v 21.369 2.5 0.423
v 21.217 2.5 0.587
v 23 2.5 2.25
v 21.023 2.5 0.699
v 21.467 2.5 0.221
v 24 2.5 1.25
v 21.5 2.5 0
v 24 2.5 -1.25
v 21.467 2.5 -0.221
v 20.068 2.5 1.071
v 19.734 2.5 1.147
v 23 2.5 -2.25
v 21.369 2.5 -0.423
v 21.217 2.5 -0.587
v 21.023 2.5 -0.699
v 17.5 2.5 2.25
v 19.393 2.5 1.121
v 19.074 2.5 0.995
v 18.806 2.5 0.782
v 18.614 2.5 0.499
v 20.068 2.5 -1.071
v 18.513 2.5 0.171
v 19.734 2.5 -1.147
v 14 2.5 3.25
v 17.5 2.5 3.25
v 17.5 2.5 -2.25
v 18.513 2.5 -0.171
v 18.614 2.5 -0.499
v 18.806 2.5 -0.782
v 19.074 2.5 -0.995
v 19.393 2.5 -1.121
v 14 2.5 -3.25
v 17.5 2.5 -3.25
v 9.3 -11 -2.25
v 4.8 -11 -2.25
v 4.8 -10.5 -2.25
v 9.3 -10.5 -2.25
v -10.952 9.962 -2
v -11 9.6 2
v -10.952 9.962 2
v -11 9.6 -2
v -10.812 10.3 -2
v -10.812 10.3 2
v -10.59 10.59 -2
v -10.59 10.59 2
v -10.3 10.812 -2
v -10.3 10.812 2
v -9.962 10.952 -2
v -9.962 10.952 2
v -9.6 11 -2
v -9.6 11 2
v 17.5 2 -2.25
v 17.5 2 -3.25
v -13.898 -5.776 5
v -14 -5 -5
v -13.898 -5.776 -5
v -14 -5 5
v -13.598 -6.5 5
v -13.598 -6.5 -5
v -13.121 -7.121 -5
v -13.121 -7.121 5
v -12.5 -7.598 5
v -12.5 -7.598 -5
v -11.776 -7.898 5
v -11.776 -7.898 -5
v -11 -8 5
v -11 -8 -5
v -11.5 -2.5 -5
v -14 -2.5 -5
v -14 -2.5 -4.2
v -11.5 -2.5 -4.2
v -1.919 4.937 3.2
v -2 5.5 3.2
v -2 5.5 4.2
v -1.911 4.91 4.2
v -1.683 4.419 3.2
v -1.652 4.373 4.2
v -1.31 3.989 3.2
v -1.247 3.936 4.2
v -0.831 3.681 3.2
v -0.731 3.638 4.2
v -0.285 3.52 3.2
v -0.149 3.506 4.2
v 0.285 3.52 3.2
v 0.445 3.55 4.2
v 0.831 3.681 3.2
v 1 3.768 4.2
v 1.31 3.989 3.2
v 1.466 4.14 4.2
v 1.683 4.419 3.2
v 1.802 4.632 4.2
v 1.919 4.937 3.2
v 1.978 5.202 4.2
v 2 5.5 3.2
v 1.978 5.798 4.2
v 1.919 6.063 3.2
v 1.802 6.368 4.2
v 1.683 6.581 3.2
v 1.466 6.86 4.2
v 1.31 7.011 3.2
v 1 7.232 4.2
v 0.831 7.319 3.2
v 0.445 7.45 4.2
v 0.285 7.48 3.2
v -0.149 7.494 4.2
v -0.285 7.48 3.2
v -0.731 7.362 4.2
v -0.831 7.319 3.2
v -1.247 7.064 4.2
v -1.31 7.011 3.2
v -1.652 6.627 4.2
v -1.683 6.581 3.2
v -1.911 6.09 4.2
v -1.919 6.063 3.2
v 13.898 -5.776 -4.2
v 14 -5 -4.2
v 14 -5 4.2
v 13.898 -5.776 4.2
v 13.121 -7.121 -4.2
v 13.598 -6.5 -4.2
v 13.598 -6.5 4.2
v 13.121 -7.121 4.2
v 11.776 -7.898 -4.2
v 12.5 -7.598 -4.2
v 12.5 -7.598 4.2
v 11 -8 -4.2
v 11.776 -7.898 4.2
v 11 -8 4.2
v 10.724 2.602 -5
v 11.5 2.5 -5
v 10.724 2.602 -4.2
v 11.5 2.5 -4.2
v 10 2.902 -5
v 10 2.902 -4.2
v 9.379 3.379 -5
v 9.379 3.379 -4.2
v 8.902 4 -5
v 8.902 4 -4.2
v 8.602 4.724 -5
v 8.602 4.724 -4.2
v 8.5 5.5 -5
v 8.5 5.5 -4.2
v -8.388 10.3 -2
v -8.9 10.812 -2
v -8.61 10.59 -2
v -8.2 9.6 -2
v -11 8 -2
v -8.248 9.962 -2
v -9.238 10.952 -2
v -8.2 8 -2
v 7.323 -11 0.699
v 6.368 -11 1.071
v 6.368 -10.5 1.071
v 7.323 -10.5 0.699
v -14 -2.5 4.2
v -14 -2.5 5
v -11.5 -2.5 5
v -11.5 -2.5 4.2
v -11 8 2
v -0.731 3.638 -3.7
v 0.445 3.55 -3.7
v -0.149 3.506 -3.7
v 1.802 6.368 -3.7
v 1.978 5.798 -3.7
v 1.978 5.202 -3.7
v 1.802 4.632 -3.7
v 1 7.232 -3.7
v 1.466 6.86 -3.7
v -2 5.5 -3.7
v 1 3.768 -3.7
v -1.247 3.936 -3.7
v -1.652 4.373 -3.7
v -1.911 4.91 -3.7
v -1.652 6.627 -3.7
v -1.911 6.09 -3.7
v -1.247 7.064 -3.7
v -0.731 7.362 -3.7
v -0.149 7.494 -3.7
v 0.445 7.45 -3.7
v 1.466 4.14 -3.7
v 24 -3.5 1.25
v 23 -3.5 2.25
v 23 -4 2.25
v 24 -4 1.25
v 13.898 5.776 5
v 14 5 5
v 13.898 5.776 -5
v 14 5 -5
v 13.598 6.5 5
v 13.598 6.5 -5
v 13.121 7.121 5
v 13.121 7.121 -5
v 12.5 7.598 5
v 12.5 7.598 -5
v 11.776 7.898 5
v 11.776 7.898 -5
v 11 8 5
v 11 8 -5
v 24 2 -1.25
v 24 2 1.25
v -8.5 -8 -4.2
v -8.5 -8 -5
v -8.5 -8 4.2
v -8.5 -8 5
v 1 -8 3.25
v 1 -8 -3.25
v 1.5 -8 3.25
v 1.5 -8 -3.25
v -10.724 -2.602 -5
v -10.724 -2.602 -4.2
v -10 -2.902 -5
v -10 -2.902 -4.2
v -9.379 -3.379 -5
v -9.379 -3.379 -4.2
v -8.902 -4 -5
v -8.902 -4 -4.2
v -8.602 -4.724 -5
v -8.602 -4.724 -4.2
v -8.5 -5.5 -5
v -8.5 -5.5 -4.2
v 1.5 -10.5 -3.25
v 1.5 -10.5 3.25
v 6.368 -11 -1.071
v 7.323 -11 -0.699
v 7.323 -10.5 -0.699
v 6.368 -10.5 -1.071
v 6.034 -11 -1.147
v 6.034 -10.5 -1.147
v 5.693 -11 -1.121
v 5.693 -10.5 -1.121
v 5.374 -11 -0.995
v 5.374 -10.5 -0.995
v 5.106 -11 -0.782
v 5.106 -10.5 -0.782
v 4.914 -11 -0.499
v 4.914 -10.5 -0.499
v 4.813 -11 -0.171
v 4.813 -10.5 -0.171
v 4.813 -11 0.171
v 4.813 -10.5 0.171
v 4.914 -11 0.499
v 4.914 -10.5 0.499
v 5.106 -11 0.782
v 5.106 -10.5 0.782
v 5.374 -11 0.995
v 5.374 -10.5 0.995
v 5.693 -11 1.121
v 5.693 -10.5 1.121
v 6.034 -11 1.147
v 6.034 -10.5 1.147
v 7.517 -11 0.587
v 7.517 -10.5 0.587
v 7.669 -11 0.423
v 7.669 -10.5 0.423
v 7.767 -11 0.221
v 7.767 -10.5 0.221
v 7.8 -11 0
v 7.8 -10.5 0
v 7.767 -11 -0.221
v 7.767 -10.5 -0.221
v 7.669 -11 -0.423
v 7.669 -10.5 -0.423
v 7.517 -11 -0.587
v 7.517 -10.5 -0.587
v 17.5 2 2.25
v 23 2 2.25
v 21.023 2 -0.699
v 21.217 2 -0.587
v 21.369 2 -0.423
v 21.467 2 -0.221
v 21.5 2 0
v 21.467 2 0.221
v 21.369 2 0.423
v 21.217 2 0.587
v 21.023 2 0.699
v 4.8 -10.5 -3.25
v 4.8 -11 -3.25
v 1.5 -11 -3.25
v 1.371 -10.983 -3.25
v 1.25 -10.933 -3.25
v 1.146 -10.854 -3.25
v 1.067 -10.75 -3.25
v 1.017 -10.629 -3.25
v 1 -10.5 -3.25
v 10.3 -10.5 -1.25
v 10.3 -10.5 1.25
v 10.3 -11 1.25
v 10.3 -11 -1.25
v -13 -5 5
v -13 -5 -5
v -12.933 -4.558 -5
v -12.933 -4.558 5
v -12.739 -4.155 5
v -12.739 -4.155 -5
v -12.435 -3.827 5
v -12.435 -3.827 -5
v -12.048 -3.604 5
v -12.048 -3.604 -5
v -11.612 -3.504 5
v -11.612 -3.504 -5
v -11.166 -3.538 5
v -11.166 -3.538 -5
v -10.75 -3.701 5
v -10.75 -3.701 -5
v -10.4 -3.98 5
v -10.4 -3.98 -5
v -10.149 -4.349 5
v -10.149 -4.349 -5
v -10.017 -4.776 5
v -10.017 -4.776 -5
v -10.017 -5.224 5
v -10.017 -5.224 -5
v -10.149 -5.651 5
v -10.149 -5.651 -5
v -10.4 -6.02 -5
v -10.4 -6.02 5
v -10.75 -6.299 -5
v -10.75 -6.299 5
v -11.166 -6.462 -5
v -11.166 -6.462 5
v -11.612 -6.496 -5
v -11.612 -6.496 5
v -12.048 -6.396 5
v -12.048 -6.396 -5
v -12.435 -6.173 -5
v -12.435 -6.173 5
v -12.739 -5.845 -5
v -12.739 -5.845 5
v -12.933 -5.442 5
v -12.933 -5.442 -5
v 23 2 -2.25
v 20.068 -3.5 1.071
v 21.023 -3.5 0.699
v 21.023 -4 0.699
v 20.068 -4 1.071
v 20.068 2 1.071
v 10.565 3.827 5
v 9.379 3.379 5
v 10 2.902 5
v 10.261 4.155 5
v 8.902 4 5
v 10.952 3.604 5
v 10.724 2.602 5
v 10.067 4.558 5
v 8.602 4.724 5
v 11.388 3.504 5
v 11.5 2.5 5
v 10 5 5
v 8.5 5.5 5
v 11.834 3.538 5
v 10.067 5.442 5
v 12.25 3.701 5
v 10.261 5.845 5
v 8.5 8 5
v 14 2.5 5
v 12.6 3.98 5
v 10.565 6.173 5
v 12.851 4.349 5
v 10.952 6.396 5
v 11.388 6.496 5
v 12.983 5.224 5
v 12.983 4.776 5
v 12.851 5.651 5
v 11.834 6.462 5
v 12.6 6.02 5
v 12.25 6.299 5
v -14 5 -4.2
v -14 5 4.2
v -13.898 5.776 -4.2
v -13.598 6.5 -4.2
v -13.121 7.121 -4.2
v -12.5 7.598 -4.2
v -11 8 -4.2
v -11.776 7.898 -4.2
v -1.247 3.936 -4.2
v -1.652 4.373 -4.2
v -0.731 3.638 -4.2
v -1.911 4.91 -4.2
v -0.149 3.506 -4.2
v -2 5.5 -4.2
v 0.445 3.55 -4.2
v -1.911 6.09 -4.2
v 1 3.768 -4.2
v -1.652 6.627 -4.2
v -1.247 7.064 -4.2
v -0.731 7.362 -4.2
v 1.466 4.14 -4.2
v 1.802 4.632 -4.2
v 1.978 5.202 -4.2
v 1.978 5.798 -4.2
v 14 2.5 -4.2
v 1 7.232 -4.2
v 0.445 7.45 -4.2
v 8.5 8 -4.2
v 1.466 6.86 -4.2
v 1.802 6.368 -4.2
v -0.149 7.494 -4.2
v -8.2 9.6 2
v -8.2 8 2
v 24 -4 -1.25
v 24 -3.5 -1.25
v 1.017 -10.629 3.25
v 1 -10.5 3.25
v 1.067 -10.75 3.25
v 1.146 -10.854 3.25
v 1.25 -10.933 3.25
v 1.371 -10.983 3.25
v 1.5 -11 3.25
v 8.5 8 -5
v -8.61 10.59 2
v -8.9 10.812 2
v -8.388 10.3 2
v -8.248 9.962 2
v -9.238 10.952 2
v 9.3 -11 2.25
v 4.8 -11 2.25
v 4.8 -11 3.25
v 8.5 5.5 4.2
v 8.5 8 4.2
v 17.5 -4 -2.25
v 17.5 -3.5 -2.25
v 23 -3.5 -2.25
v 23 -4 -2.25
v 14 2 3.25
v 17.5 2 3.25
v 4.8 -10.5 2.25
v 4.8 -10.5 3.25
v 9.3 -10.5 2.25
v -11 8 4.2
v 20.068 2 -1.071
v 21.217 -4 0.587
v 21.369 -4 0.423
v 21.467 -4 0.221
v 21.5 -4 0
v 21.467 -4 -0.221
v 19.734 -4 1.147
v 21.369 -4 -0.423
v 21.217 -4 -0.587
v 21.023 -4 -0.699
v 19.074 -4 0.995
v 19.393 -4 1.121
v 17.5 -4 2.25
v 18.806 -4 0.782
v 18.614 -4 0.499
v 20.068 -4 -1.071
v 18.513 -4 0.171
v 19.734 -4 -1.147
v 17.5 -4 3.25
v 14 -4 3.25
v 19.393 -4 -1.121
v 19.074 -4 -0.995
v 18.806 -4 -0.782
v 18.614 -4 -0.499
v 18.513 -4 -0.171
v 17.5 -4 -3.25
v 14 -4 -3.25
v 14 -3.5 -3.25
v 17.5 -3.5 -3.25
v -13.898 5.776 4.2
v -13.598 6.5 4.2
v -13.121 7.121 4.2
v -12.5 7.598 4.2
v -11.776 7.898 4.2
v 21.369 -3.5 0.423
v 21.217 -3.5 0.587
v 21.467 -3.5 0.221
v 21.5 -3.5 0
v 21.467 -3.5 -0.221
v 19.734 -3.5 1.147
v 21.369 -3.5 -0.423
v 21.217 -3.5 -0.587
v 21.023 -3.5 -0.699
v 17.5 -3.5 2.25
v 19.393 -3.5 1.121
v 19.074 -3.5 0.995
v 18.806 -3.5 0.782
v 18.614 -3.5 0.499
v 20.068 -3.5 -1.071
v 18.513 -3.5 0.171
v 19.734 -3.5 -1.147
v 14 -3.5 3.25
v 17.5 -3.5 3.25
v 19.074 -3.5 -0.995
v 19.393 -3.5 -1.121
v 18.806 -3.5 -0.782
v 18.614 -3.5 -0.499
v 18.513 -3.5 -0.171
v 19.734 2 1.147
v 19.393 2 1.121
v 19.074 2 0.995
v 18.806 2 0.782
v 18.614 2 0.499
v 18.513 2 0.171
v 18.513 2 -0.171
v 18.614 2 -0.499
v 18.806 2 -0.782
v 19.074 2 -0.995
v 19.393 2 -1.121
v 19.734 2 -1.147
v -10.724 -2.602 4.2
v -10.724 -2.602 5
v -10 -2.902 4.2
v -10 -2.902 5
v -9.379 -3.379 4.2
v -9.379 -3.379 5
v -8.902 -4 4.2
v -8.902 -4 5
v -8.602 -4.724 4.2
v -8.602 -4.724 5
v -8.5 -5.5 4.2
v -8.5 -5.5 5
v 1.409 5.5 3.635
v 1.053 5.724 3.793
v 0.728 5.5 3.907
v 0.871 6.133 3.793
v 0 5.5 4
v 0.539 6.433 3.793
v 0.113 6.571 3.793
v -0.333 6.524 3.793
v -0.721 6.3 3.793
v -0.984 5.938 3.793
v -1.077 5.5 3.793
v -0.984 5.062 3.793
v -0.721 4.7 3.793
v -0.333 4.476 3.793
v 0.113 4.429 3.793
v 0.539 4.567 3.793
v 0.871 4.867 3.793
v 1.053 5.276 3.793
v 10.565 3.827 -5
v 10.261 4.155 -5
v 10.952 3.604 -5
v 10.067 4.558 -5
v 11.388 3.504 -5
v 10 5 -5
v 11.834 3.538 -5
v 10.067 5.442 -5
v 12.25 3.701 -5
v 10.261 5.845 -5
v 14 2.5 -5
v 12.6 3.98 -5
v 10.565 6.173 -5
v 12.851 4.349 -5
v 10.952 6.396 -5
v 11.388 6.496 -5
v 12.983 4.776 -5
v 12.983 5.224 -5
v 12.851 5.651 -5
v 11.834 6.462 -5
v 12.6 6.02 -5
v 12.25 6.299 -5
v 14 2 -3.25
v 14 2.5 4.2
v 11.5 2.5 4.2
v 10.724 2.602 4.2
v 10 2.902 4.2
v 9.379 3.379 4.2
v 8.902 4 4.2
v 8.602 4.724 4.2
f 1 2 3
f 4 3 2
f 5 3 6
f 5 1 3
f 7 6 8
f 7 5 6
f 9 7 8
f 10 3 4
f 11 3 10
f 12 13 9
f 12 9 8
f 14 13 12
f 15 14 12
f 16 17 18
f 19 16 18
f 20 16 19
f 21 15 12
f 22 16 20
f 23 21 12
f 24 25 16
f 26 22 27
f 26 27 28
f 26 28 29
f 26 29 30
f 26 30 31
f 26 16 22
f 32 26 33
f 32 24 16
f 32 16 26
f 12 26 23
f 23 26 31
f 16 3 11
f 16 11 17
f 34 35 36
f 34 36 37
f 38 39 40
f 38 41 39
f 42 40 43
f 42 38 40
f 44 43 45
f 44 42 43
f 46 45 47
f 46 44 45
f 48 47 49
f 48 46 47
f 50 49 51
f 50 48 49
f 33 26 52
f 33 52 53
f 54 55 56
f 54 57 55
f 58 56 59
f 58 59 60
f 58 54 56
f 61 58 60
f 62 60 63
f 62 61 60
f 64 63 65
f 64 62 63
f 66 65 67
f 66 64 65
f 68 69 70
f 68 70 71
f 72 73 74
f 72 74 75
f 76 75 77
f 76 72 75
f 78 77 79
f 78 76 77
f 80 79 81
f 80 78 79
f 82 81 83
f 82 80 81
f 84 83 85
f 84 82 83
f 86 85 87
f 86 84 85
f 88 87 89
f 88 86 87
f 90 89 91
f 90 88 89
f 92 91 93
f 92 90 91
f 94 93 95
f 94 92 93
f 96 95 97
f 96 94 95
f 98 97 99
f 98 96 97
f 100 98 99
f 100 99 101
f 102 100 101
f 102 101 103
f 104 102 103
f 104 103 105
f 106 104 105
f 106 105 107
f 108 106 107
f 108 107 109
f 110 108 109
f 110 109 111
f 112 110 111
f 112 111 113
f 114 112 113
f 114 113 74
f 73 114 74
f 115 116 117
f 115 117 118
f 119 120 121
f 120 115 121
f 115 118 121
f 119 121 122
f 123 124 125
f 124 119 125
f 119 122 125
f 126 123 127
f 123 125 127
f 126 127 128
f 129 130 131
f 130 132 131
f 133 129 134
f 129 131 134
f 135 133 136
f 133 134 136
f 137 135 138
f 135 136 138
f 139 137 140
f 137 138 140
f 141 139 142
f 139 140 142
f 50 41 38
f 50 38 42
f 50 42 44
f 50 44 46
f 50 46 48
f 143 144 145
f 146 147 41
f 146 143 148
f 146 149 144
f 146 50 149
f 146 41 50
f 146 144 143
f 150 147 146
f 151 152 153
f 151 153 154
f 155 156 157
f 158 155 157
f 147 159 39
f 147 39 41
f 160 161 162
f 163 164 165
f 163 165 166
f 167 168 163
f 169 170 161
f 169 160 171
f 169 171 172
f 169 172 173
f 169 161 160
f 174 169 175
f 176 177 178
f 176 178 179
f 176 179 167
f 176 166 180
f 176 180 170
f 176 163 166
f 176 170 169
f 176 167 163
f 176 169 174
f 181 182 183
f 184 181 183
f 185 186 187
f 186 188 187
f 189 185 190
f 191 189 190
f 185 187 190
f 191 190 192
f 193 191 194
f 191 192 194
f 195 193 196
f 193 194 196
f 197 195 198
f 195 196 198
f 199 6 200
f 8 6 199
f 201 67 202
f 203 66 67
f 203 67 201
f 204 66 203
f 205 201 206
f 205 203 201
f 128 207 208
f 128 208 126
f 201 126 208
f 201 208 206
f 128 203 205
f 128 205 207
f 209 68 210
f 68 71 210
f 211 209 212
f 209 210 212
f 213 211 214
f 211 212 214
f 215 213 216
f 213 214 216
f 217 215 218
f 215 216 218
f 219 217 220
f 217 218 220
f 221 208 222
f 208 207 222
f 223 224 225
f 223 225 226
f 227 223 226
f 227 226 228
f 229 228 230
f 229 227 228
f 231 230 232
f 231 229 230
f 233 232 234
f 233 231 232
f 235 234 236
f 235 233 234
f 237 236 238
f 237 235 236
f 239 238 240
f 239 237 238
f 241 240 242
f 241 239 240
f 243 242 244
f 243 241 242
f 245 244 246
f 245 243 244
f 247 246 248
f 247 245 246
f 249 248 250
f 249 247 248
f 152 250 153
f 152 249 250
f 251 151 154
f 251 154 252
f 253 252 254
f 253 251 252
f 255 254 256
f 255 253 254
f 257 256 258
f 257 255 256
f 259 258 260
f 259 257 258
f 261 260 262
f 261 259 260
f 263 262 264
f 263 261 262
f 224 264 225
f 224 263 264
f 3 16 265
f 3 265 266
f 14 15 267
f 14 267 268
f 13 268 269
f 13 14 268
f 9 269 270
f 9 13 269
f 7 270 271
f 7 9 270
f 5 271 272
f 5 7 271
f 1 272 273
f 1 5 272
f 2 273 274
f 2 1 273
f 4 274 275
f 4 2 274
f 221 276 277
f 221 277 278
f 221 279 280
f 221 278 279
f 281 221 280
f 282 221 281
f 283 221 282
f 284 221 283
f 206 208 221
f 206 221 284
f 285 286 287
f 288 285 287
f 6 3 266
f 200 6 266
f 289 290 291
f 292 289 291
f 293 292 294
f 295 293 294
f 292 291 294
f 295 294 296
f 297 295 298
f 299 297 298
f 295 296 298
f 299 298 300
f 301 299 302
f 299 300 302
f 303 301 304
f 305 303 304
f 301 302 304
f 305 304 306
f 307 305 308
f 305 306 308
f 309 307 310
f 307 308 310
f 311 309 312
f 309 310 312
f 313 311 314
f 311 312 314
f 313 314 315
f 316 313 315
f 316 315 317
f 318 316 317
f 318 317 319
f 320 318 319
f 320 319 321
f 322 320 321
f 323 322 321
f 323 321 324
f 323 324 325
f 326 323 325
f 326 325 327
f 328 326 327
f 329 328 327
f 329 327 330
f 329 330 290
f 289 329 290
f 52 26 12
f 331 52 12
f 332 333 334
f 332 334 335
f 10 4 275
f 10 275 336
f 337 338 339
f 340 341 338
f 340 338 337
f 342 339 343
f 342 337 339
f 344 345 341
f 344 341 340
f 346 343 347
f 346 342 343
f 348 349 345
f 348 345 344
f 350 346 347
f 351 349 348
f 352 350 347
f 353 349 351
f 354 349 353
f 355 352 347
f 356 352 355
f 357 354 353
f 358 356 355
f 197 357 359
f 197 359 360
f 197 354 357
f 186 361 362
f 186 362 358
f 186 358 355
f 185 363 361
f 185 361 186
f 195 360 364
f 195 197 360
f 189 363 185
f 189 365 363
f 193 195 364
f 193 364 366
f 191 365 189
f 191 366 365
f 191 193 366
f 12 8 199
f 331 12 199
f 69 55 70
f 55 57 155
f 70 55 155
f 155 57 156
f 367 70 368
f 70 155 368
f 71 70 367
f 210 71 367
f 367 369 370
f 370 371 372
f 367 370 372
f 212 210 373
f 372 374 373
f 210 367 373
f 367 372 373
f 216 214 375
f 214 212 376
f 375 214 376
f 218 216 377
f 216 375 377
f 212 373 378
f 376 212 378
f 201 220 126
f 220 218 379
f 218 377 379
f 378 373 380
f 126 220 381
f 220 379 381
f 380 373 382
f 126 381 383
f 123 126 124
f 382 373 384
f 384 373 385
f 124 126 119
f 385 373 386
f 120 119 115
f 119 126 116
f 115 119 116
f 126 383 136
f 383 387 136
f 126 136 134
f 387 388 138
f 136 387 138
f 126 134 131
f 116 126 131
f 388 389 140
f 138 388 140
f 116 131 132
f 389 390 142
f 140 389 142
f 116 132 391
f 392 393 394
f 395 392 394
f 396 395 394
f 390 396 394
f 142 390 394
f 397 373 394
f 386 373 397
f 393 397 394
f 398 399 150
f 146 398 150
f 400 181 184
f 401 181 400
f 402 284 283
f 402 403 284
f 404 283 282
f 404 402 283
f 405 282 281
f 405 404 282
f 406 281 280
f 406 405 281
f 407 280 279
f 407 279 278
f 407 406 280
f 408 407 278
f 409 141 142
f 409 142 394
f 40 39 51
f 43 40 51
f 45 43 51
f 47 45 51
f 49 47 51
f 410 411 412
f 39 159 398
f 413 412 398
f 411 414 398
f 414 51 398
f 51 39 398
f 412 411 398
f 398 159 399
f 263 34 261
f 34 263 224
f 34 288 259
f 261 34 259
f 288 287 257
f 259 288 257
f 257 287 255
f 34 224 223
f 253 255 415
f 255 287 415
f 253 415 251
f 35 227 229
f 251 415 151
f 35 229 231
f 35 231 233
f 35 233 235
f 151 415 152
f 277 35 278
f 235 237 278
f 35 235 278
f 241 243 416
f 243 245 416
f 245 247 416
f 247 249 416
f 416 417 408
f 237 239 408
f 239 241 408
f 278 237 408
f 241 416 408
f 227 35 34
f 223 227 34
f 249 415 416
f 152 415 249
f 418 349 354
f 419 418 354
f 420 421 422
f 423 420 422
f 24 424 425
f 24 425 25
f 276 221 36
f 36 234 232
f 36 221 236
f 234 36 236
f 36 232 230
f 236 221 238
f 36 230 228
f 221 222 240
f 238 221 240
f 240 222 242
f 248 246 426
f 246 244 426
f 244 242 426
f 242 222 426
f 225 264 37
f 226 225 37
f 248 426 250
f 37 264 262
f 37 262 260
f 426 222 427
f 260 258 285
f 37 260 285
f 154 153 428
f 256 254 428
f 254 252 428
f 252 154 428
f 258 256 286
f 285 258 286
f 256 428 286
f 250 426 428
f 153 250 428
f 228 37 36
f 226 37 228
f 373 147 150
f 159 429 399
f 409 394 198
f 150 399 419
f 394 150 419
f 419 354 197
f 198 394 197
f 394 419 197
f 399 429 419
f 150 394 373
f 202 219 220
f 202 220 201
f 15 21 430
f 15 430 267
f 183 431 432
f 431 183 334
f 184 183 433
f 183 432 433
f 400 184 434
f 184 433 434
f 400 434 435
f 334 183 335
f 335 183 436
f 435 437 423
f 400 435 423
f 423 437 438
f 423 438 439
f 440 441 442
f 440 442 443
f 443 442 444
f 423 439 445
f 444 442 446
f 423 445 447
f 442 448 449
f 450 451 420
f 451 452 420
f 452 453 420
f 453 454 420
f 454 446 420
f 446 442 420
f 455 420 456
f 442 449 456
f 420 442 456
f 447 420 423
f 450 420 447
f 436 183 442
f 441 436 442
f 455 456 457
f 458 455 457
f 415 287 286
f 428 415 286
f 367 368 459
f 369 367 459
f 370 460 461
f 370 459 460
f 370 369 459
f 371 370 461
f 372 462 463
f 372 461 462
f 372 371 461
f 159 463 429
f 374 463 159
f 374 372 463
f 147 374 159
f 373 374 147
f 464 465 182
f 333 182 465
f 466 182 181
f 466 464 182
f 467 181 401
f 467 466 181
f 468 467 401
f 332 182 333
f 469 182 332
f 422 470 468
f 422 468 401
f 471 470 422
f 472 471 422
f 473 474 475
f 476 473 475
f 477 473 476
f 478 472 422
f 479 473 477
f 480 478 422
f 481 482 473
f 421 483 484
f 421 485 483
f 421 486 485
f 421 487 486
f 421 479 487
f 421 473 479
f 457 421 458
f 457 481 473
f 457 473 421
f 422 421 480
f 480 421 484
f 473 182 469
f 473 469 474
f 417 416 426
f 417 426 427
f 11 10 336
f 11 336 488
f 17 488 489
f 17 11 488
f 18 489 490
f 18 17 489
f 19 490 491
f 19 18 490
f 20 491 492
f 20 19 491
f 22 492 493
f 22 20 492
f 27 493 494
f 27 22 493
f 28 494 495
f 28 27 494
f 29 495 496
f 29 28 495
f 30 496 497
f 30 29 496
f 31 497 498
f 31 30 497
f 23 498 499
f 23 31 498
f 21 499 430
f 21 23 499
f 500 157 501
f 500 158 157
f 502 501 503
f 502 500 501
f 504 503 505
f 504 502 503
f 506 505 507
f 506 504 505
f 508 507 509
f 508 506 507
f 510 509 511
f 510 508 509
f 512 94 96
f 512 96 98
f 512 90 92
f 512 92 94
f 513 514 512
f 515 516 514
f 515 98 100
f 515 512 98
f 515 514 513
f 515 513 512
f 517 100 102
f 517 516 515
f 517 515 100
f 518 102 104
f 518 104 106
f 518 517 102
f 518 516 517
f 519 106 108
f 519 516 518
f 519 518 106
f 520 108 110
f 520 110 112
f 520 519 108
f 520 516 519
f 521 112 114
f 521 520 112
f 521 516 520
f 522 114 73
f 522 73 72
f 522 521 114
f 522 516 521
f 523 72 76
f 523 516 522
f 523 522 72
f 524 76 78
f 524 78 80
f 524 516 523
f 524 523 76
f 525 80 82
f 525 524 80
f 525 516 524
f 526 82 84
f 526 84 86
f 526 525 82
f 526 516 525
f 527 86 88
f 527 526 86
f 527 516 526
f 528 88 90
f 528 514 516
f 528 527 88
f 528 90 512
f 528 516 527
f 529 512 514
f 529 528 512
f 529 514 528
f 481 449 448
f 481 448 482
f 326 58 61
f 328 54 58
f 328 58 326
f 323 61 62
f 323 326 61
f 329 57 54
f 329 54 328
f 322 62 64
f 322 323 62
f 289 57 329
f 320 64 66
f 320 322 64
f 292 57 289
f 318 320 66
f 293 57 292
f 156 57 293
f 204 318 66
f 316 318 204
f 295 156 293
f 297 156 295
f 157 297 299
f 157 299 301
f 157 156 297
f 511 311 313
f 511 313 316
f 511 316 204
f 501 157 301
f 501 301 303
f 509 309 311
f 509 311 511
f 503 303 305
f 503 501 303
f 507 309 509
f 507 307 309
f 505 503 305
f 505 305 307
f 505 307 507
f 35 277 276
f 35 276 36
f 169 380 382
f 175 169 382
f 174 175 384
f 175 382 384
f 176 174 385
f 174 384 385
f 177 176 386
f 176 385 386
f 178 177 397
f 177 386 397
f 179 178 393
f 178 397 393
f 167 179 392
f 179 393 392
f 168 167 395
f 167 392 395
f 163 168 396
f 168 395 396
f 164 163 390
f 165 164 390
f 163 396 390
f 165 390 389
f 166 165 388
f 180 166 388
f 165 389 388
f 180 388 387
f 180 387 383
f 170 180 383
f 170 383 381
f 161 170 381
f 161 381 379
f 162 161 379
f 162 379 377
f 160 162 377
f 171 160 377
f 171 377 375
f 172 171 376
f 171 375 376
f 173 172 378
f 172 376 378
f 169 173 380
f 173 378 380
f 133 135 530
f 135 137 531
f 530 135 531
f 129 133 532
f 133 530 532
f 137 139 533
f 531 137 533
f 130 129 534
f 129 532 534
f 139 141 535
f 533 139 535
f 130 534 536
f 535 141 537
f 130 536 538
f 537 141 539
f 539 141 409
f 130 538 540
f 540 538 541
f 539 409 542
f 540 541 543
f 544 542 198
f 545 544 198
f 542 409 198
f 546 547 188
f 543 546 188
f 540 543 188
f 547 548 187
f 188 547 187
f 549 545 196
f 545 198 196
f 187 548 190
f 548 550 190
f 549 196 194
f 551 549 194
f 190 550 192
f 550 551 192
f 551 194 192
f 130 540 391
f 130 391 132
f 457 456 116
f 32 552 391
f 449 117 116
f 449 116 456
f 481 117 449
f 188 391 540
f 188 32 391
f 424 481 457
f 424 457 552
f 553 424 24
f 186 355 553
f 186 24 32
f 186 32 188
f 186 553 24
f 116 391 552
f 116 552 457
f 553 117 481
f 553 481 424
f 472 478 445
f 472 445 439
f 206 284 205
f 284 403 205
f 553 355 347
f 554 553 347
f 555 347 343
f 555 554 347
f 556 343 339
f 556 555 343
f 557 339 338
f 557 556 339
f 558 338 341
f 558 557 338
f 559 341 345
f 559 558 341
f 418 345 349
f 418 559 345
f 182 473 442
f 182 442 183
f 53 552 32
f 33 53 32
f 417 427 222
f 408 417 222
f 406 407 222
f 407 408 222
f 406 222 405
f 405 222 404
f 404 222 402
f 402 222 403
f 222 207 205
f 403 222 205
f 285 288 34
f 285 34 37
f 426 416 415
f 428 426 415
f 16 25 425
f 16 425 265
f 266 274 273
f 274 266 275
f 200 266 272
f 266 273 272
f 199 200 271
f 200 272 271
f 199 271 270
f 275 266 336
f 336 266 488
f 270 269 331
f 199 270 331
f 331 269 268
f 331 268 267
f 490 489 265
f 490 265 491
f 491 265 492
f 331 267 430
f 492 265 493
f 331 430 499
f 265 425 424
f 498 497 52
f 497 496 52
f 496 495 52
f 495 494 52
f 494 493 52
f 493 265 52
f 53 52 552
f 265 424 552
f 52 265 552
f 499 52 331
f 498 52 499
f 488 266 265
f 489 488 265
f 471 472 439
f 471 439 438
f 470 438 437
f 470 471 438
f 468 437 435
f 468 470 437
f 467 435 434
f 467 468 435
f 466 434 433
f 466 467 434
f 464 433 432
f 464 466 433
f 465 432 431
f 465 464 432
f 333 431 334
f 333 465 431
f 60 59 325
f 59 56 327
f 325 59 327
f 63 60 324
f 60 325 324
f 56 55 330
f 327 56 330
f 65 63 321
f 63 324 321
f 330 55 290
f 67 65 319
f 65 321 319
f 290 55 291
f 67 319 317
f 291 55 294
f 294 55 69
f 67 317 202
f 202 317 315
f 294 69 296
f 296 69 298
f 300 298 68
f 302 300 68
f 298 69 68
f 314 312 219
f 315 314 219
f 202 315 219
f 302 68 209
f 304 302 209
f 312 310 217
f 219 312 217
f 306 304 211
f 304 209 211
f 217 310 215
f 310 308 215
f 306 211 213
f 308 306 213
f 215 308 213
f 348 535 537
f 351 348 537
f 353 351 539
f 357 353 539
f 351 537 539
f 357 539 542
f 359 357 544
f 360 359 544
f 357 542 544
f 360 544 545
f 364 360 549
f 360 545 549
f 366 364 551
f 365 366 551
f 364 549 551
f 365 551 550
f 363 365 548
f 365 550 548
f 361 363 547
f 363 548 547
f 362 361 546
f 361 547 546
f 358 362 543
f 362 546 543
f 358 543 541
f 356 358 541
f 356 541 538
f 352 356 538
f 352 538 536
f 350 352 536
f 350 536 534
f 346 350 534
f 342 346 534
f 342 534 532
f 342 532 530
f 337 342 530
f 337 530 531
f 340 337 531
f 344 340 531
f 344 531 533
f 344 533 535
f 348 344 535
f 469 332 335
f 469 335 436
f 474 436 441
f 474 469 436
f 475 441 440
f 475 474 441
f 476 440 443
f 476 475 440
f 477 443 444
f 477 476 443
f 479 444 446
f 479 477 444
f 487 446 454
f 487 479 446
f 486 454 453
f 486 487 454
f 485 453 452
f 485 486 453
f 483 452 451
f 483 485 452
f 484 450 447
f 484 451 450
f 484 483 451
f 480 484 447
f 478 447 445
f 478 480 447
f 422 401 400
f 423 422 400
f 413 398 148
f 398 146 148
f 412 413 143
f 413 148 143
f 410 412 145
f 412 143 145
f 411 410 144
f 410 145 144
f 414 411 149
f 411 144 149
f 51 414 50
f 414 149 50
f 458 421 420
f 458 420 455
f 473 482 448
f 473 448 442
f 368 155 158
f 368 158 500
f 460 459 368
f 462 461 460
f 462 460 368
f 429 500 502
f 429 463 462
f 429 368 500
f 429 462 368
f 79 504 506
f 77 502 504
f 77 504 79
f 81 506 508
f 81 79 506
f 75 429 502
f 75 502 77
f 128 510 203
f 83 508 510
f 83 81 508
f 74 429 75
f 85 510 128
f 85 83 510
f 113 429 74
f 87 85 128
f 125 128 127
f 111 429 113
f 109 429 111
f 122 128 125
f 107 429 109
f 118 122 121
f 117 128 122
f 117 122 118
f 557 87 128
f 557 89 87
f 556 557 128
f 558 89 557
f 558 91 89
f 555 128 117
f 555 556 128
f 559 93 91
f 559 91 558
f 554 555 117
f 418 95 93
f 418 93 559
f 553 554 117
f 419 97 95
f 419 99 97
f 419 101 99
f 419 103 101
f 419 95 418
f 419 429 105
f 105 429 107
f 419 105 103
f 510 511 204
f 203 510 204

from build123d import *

# Parameters (mm, degrees)
SKETCH_1_W             = 28
SKETCH_1_H             = 16
EXTRUDE_1_DEPTH        = 5
FILLET_1_R             = 3
CUT_EXTRUDE_2_DEPTH    = 0.8
FILLET_2_R             = 3
FILLET_2_OF_MIRROR_1_R = 3
SKETCH_3_R             = 1.5
CUT_EXTRUDE_3_DEPTH    = 19.973665961
SKETCH_4_R             = 2
CUT_EXTRUDE_4_DEPTH    = 0.5
CUT_EXTRUDE_START      = -1
SKETCH_5_R             = 2
CUT_EXTRUDE_5_DEPTH    = 1
SKETCH_10_W            = 6.5
SKETCH_10_H            = 0.5
EXTRUDE_9_DEPTH        = 10
SKETCH_11_W            = 6.5
SKETCH_11_H            = 1
CUT_EXTRUDE_10_DEPTH   = 27.669270706
CHAMFER_1_SIZE         = 1
EXTRUDE_11_DEPTH       = 3.25
FILLET_7_R             = 0.5
SKETCH_13_W            = 5.5
SKETCH_13_H            = 1
CUT_EXTRUDE_12_DEPTH   = 3
CHAMFER_2_SIZE         = 1
SKETCH_14_W            = 2.8
SKETCH_14_H            = 4
EXTRUDE_13_DEPTH       = 3
FILLET_8_R             = 1.4


with BuildPart() as part:
    # 草圖1 → 伸長1 (new, symmetric)
    with BuildSketch(Plane.XY):
        Rectangle(SKETCH_1_W, SKETCH_1_H)
    extrude(amount=EXTRUDE_1_DEPTH, both=True)

    # 圓角1
    fillet_1_edges = [part.edges().sort_by_distance(p)[0] for p in [
        (-14, 8, 0),
        (14, 8, 0),
        (14, -8, 0),
        (-14, -8, 0),
    ]]
    fillet(fillet_1_edges, radius=FILLET_1_R)

    # 草圖2 → 伸長2 (cut)
    with BuildSketch(Plane.XY.offset(5)):
        with BuildLine():
            Line((-14, -2.5), (-8.5, -2.5))
            Line((-8.5, -2.5), (-8.5, -8))
            Line((-8.5, -8), (11, -8))
            ThreePointArc((11, -8), (13.121320344, -7.121320344), (14, -5))
            Line((14, -5), (14, 2.5))
            Line((14, 2.5), (8.5, 2.5))
            Line((8.5, 2.5), (8.5, 8))
            Line((8.5, 8), (-11, 8))
            ThreePointArc((-11, 8), (-13.121320344, 7.121320344), (-14, 5))
            Line((-14, 5), (-14, -2.5))
        make_face()
    cut_extrude_2 = extrude(amount=-CUT_EXTRUDE_2_DEPTH, mode=Mode.SUBTRACT)

    # 圓角2
    fillet_2_edges = [part.edges().sort_by_distance(p)[0] for p in [
        (8.5, 2.5, 4.6),
        (-8.5, -2.5, 4.6),
    ]]
    fillet(fillet_2_edges, radius=FILLET_2_R)

    # 鏡射1: 伸長2 across plane
    add(cut_extrude_2.mirror(Plane.XY), mode=Mode.SUBTRACT)

    # 圓角2 of 鏡射1
    fillet_2_of_mirror_1_edges = [part.edges().sort_by_distance(p)[0] for p in [
        (8.5, 2.5, -4.6),
        (-8.5, -2.5, -4.6),
    ]]
    fillet(fillet_2_of_mirror_1_edges, radius=FILLET_2_OF_MIRROR_1_R)

    # 草圖3 → 伸長3 (cut, through all)
    with BuildSketch(Plane(origin=(0, 0, -5), x_dir=(-1, 0, 0), z_dir=(0, 0, -1))):
        with Locations((-11.5, 5)):
            Circle(SKETCH_3_R)
        with Locations((11.5, -5)):
            Circle(SKETCH_3_R)
    extrude(amount=-CUT_EXTRUDE_3_DEPTH, mode=Mode.SUBTRACT)

    # 草圖4 → 伸長4 (cut)
    with BuildSketch(Plane(origin=(0, 0, -4.2), x_dir=(-1, 0, 0), z_dir=(0, 0, -1))):
        with Locations((0, 5.5)):
            Circle(SKETCH_4_R)
    extrude(amount=-CUT_EXTRUDE_4_DEPTH, mode=Mode.SUBTRACT)

    # 草圖5 → 伸長5 (cut)
    with BuildSketch(Plane.XY.offset(4.2).offset(CUT_EXTRUDE_START)):
        with Locations(Location((0, 5.5, 0), (0, 0, 180))):
            Circle(SKETCH_5_R)
    extrude(amount=CUT_EXTRUDE_5_DEPTH, mode=Mode.SUBTRACT)

    # 草圖9 → 旋轉1 (revolve)
    with BuildSketch(Plane(origin=(0, 5.5, 0), x_dir=(-1, 0, 0), z_dir=(0, 1, 0)), mode=Mode.PRIVATE) as revolve_1_sk:
        with BuildLine():
            Line((0, 3.2), (2, 3.2))
            ThreePointArc((2, 3.2), (1.077032961, 3.792582404), (0, 4))
            Line((0, 4), (0, 3.2))
        make_face()
    revolve(revolve_1_sk.sketch.rotate(Axis((0, 5.5, 3.2), (0, 0, 1)), 180), axis=Axis((0, 5.5, 3.2), (0, 0, 1)))

    # 草圖10 → 伸長9 (add)
    with BuildSketch(Plane(origin=(14, 0, 0), x_dir=(0, 0, -1), z_dir=(1, 0, 0))):
        with Locations((0, -3.75)):
            Rectangle(SKETCH_10_W, SKETCH_10_H)
        with Locations((0, 2.25)):
            Rectangle(SKETCH_10_W, SKETCH_10_H)
    extrude(amount=EXTRUDE_9_DEPTH)

    # 草圖11 → 伸長10 (cut, through all)
    with BuildSketch(Plane(origin=(0, 2.5, 0), x_dir=(1, 0, 0), z_dir=(0, 1, 0))):
        with BuildLine():
            Line((20.068181818, 1.071272126), (21.022727273, 0.698655734))
            ThreePointArc((21.022727273, 0.698655734), (21.5, 0), (21.022727273, -0.698655734))
            Line((21.022727273, -0.698655734), (20.068181818, -1.071272126))
            ThreePointArc((20.068181818, -1.071272126), (18.5, 0), (20.068181818, 1.071272126))
        make_face()
        with Locations((20.75, 2.75)):
            Rectangle(SKETCH_11_W, SKETCH_11_H)
        with Locations((20.75, -2.75)):
            Rectangle(SKETCH_11_W, SKETCH_11_H)
    extrude(amount=-CUT_EXTRUDE_10_DEPTH, mode=Mode.SUBTRACT)

    # 導角1
    chamfer_1_edges = [part.edges().sort_by_distance(p)[0] for p in [
        (24, 2.25, -2.25),
        (24, -3.75, -2.25),
        (24, 2.25, 2.25),
        (24, -3.75, 2.25),
    ]]
    chamfer(chamfer_1_edges, length=CHAMFER_1_SIZE)

    # 草圖12 → 伸長11 (add, symmetric)
    with BuildSketch(Plane.XY):
        Polygon((1, -8), (1.5, -8), (1.5, -10.5), (10.3, -10.5), (10.3, -11), (1, -11), align=None)
    extrude(amount=EXTRUDE_11_DEPTH, both=True)

    # 圓角7
    fillet_7_edges = [part.edges().sort_by_distance(p)[0] for p in [
        (1, -11, 0),
    ]]
    fillet(fillet_7_edges, radius=FILLET_7_R)

    # 草圖13 → 伸長12 (cut)
    with BuildSketch(Plane.XZ.offset(11)):
        with Locations((7.55, 2.75)):
            Rectangle(SKETCH_13_W, SKETCH_13_H)
        with Locations((7.55, -2.75)):
            Rectangle(SKETCH_13_W, SKETCH_13_H)
        with BuildLine():
            Line((6.368181818, 1.071272126), (7.322727273, 0.698655734))
            ThreePointArc((7.322727273, 0.698655734), (7.8, 0), (7.322727273, -0.698655734))
            Line((7.322727273, -0.698655734), (6.368181818, -1.071272126))
            ThreePointArc((6.368181818, -1.071272126), (4.8, 0), (6.368181818, 1.071272126))
        make_face()
    extrude(amount=-CUT_EXTRUDE_12_DEPTH, mode=Mode.SUBTRACT)

    # 導角2
    chamfer_2_edges = [part.edges().sort_by_distance(p)[0] for p in [
        (10.3, -10.75, 2.25),
        (10.3, -10.75, -2.25),
    ]]
    chamfer(chamfer_2_edges, length=CHAMFER_2_SIZE)

    # 草圖14 → 伸長13 (add)
    with BuildSketch(Plane(origin=(0, 8, 0), x_dir=(1, 0, 0), z_dir=(0, 1, 0))):
        with Locations((-9.6, 0)):
            Rectangle(SKETCH_14_W, SKETCH_14_H)
    extrude(amount=EXTRUDE_13_DEPTH)

    # 圓角8
    fillet_8_edges = [part.edges().sort_by_distance(p)[0] for p in [
        (-8.2, 11, 0),
        (-11, 11, 0),
    ]]
    fillet(fillet_8_edges, radius=FILLET_8_R - 0.0001)  # a hair under: the kernel refuses the full size


solid = part.part
